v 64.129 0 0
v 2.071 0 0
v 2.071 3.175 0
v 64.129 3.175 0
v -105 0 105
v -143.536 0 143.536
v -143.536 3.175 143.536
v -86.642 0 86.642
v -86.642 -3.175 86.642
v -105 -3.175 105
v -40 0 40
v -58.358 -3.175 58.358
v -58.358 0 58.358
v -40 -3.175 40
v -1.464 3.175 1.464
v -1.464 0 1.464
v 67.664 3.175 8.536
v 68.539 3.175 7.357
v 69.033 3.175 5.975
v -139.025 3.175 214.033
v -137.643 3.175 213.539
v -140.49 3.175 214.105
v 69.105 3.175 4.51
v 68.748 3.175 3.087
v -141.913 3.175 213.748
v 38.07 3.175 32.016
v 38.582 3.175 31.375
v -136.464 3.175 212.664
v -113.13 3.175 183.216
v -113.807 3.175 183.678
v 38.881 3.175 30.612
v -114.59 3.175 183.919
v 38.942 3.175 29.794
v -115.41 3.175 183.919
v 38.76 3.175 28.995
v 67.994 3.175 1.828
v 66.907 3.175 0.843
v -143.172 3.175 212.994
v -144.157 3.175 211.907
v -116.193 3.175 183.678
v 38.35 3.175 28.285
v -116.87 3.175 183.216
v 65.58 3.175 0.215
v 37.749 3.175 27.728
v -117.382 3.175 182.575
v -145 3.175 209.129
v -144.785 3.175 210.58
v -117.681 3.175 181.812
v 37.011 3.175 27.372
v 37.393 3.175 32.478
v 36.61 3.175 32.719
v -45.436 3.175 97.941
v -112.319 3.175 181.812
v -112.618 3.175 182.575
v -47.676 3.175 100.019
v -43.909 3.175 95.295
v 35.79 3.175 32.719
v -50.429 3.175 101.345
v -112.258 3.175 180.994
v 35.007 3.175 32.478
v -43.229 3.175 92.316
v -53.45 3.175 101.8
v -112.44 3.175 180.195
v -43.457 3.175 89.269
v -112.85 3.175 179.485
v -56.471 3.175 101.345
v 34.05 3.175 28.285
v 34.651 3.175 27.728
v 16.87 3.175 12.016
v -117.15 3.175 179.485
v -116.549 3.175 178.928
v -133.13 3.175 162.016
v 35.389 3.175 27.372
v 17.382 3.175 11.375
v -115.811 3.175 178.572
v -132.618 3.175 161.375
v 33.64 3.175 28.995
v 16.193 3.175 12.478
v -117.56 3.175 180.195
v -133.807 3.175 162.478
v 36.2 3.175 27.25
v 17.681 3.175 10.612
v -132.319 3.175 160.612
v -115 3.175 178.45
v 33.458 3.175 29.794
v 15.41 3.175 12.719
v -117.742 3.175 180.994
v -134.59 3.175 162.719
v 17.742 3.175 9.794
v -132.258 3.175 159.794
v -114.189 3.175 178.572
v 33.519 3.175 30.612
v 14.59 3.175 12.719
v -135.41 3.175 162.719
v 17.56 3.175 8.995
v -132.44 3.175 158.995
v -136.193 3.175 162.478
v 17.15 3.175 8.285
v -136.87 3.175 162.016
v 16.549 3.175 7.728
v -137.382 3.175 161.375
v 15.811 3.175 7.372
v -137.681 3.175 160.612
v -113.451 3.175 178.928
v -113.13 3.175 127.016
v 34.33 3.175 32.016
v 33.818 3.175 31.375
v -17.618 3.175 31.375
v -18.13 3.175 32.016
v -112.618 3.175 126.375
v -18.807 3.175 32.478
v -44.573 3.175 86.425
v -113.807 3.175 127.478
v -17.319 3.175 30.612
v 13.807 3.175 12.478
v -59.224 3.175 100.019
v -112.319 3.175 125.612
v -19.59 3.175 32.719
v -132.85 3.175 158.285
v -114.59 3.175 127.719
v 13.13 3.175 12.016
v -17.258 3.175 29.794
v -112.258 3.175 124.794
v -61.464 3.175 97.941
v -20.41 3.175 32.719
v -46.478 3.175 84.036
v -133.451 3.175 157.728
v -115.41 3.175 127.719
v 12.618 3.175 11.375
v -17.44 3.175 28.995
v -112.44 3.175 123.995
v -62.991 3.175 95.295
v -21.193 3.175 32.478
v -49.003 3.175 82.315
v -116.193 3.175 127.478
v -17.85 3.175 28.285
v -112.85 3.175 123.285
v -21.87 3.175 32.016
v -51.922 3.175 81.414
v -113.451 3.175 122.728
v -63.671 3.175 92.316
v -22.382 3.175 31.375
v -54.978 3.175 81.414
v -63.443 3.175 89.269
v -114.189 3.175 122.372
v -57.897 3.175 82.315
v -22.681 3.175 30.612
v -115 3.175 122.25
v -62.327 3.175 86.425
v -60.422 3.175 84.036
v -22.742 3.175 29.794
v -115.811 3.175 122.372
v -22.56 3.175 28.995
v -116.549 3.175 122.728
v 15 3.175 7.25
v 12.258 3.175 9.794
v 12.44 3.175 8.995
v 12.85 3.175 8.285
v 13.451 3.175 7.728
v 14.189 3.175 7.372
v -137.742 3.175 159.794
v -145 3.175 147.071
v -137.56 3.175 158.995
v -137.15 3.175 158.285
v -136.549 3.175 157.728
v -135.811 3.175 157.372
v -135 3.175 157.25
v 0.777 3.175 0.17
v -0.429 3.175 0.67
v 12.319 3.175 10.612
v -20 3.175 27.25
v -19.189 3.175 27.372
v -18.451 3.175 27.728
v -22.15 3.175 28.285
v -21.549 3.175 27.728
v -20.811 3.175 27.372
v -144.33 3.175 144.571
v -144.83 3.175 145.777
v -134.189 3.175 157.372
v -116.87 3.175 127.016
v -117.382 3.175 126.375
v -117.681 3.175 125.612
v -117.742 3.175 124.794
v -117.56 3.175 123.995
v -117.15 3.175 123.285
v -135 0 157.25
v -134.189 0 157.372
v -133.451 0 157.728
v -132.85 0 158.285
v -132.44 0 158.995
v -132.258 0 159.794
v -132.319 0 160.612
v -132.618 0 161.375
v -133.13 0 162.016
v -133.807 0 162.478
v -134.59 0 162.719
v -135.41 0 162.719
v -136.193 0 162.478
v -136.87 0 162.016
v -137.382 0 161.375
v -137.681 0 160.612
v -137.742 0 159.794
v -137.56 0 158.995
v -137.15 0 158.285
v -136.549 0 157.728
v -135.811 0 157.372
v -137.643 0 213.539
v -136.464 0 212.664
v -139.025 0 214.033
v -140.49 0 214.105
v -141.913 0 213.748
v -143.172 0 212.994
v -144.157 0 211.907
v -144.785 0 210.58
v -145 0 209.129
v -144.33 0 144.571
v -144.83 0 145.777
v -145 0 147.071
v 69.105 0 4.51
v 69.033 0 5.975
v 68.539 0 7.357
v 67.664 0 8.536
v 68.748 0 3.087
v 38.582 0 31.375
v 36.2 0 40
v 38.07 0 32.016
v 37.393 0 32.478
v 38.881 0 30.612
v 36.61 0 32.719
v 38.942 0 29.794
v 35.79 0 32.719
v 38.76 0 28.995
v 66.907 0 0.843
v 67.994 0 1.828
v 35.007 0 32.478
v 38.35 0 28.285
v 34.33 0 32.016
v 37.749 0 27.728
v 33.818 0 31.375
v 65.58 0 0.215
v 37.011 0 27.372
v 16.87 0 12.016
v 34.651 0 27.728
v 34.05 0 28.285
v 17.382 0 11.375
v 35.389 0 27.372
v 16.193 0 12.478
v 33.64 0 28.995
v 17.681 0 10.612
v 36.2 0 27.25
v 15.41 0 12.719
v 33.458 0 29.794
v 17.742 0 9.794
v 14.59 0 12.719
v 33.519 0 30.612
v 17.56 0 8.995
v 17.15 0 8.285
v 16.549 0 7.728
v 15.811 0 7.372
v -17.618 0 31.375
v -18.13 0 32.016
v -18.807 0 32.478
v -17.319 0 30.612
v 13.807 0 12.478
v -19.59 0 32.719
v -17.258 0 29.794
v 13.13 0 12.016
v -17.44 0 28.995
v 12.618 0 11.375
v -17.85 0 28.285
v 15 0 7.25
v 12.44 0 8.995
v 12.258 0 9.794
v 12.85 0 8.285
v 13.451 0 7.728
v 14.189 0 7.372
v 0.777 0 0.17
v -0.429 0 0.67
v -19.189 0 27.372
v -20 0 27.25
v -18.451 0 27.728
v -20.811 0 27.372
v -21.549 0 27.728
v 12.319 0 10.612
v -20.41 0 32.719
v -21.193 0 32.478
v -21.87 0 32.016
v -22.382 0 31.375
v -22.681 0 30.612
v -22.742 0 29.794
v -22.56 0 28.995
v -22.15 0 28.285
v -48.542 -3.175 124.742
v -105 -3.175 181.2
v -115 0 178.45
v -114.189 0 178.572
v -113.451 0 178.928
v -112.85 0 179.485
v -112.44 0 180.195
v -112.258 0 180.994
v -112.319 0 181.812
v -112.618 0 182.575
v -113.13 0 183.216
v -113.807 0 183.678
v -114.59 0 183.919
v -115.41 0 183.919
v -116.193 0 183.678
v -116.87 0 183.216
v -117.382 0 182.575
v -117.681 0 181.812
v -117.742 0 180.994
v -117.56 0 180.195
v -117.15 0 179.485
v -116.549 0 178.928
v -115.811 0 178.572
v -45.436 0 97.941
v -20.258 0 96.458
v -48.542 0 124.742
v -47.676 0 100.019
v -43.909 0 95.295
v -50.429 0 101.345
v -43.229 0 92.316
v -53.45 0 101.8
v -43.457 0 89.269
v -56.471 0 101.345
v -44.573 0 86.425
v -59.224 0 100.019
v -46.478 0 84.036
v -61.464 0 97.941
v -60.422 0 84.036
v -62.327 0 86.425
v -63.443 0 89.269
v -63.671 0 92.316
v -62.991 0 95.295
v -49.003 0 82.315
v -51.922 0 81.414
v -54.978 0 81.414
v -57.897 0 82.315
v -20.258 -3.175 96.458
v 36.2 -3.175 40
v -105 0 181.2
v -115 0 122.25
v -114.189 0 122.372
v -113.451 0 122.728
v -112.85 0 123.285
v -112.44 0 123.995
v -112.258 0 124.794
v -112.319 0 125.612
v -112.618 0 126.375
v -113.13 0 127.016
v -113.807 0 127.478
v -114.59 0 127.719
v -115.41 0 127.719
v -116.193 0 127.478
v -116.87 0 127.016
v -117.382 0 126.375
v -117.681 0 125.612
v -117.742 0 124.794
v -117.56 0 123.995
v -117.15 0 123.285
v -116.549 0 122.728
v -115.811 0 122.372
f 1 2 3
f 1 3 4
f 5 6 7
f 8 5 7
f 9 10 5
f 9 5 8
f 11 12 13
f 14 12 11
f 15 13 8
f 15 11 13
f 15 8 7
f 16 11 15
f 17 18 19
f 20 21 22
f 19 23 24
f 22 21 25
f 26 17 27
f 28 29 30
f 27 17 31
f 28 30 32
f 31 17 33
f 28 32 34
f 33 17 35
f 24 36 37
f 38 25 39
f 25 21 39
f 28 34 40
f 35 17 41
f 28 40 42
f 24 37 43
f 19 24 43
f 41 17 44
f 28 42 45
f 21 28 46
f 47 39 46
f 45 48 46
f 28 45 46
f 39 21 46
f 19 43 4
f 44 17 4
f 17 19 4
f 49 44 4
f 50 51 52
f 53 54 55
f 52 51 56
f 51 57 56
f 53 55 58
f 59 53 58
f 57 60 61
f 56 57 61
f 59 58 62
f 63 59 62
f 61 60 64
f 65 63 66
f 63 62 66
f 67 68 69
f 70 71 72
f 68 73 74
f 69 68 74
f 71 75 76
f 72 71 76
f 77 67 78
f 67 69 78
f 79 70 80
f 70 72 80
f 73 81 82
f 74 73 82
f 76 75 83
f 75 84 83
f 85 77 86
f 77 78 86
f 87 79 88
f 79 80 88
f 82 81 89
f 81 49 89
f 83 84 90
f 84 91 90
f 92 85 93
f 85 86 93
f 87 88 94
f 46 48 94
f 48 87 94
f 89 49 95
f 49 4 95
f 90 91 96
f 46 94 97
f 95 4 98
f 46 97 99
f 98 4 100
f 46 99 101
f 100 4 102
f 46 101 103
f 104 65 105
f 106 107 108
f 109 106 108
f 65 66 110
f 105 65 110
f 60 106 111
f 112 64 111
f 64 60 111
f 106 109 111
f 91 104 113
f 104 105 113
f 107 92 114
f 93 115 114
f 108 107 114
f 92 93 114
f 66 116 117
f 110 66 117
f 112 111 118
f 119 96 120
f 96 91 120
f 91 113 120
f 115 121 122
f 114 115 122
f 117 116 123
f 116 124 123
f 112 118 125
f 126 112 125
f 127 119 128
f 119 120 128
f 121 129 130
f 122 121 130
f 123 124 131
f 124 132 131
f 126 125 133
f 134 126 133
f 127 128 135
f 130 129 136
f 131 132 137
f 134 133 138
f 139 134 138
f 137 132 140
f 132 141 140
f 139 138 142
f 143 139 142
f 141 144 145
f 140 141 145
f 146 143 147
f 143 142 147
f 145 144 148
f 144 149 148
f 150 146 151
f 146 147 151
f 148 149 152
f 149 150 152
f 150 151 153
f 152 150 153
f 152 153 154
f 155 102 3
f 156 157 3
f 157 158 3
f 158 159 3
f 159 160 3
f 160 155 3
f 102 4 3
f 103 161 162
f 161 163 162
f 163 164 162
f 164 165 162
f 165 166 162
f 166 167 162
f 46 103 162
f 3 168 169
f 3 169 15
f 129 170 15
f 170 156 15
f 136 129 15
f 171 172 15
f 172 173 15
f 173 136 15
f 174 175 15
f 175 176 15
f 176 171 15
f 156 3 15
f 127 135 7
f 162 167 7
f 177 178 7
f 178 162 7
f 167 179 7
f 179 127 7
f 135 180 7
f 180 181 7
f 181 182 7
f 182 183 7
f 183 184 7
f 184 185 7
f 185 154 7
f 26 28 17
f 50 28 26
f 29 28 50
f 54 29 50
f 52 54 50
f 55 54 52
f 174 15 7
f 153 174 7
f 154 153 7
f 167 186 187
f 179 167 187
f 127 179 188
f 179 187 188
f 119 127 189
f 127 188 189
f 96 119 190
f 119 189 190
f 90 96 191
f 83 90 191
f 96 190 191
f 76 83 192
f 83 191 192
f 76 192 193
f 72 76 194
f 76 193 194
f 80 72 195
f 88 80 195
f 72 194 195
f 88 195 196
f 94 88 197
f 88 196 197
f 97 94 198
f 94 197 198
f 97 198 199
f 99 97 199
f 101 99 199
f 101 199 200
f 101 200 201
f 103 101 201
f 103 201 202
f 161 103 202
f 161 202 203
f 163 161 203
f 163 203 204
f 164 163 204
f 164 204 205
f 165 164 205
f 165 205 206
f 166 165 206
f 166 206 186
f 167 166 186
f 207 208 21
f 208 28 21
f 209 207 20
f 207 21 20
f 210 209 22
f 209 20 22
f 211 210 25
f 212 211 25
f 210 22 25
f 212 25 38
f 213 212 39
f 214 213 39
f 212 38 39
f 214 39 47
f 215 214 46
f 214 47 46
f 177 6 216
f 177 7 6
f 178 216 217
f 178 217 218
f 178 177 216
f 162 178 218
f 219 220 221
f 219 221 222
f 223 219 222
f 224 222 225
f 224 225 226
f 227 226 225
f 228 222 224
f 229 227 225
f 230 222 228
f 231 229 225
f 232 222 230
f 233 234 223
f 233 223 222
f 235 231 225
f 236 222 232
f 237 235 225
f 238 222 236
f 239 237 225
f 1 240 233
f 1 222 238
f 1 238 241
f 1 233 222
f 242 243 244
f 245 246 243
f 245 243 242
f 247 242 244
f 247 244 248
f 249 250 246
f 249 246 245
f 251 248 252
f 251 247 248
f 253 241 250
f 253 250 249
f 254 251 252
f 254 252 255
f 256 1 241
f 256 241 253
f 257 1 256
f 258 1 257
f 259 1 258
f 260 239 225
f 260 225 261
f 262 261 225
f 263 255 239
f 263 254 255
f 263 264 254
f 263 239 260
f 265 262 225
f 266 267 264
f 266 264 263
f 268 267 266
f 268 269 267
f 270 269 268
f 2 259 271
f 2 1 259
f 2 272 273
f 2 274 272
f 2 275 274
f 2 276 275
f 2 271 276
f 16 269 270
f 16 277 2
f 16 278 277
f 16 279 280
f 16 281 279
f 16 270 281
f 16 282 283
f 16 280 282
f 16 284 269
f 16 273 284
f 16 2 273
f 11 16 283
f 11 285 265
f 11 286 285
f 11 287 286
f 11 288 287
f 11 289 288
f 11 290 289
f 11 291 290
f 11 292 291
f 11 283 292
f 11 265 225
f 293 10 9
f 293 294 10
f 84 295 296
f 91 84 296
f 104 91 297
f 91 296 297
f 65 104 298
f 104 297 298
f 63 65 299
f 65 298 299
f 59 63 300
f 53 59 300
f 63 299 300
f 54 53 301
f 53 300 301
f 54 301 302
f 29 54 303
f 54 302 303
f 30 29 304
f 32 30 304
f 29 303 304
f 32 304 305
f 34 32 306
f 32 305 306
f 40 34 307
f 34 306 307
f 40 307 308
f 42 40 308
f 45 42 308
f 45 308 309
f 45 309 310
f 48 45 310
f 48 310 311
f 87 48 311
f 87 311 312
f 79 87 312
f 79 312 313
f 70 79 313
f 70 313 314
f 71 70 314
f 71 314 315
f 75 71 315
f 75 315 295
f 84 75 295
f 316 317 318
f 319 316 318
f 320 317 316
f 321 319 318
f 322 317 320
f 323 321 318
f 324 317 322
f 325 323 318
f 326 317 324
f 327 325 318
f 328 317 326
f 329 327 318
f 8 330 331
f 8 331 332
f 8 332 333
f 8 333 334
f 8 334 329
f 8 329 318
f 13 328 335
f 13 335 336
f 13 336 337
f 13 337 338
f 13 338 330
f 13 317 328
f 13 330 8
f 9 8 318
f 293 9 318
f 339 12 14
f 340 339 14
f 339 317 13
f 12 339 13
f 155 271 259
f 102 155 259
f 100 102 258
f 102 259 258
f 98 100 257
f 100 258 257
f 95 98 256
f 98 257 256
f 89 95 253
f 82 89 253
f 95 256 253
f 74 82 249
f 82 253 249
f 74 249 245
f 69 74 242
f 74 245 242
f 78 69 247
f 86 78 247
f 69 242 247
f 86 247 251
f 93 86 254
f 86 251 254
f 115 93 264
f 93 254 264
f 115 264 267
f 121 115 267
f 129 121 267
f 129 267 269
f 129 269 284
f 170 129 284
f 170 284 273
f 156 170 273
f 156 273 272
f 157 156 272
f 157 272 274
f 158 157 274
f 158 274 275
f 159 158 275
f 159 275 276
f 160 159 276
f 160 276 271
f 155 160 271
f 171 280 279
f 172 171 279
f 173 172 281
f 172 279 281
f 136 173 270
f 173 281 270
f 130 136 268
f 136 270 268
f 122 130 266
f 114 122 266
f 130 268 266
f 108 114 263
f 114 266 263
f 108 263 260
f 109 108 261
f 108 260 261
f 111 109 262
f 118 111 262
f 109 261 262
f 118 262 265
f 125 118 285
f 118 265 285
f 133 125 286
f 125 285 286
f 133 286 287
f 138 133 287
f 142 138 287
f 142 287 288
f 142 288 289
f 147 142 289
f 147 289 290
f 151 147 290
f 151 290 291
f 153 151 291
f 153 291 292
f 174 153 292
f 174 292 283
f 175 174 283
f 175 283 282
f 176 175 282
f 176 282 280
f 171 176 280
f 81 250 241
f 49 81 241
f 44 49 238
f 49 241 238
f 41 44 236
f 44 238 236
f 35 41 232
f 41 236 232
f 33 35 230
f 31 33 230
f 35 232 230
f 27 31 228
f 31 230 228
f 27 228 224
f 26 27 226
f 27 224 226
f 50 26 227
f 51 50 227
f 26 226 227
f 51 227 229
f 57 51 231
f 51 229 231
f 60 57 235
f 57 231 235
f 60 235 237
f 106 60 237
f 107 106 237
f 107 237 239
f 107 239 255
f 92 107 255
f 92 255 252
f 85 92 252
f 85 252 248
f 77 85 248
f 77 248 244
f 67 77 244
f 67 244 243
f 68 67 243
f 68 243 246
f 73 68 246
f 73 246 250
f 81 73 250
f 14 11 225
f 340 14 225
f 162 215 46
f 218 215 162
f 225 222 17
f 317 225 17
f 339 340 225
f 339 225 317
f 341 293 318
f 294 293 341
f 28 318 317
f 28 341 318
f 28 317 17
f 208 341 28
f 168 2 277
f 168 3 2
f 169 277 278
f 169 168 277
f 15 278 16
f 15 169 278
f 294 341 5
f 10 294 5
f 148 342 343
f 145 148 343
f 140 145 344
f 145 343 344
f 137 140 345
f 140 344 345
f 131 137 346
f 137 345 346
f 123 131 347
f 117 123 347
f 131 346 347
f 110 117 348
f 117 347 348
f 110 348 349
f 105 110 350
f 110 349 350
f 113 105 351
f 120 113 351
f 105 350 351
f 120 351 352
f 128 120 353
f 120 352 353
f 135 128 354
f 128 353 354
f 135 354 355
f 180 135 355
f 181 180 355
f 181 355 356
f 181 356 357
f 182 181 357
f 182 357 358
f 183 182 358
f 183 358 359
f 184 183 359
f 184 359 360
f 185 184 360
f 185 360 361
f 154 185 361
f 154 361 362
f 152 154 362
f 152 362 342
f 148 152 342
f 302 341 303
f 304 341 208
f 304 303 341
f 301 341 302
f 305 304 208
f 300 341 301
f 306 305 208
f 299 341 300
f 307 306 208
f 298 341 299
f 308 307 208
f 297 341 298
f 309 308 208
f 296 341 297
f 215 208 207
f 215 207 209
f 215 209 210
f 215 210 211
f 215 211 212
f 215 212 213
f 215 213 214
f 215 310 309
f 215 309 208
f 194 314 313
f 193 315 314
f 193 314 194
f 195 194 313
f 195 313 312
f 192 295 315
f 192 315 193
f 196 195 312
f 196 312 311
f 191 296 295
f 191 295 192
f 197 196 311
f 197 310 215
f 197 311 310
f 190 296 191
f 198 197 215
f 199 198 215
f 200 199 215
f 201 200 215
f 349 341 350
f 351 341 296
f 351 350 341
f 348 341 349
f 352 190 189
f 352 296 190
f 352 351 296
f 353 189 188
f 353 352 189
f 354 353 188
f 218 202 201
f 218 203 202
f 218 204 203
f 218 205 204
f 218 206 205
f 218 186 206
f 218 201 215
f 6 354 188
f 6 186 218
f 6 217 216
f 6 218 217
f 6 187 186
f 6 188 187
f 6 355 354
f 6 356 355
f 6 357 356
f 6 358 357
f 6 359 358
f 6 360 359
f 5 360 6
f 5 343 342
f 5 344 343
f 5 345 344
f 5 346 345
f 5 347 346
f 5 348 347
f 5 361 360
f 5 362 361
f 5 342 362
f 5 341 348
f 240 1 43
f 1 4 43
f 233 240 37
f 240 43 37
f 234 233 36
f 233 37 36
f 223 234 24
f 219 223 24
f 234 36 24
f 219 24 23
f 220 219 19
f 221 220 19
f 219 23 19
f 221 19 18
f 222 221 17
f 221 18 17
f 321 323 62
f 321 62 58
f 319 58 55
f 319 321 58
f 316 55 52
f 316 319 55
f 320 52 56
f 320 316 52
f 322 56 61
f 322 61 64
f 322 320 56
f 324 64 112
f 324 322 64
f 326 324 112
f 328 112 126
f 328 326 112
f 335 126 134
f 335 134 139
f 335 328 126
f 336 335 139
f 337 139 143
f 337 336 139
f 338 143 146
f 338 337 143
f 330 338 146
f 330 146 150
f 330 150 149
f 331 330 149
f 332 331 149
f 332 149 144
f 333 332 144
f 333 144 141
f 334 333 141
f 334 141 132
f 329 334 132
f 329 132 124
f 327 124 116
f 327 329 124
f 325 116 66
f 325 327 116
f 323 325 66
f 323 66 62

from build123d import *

# Parameters (mm, degrees)
SKETCH1_R           = 10.25
BOSS_EXTRUDE1_DEPTH = 3.175
BOSS_EXTRUDE2_DEPTH = 3.175
FILLET1_R           = 5
CUT_EXTRUDE1_REACH  = 260.624
SKETCH3_R           = 2.75


with BuildPart() as part:
    # Sketch1 → Boss-Extrude1 (new body)
    with BuildSketch(Plane(origin=(0, 0, 0), x_dir=(1, 0, 0), z_dir=(0, 1, 0))):
        Polygon((0, 0), (76.2, 0), (-145, -221.2), (-145, -145), align=None)
        with Locations(Location((-53.45, -91.55, 0), (0, 0, 270))):
            Circle(SKETCH1_R, mode=Mode.SUBTRACT)
    extrude(amount=BOSS_EXTRUDE1_DEPTH)

    # Sketch2 → Boss-Extrude2 (add)
    with BuildSketch(Plane.XZ):
        Polygon((-20.257864376, 96.457864376), (-58.357864376, 58.357864376), (-40, 40), (36.2, 40), align=None)
        Polygon((-105, 105), (-86.642135624, 86.642135624), (-48.542135624, 124.742135624), (-105, 181.2), align=None)
    extrude(amount=BOSS_EXTRUDE2_DEPTH)

    # Fillet1
    fillet1_edges = [part.edges().sort_by_distance(p)[0] for p in [
        (0, 1.5875, 0),
        (76.2, 1.5875, 0),
        (-145, 1.5875, 221.2),
        (-145, 1.5875, 145),
    ]]
    fillet(fillet1_edges, radius=FILLET1_R)

    # Sketch3 → Cut-Extrude1 (cut, up to next)
    with BuildSketch(Plane(origin=(0, 0, 0), x_dir=(-1, 0, 0), z_dir=(0, -1, 0)), mode=Mode.PRIVATE) as cut_extrude1_sk1:
        with Locations(Location((115, -125, 0), (0, 0, 90))):
            Circle(SKETCH3_R)
    cut_extrude1_tool1 = extrude(cut_extrude1_sk1.sketch, amount=-CUT_EXTRUDE1_REACH, mode=Mode.PRIVATE) & part.part
    # Sketch3 → Cut-Extrude1 (cut, up to next)
    with BuildSketch(Plane(origin=(0, 0, 0), x_dir=(-1, 0, 0), z_dir=(0, -1, 0)), mode=Mode.PRIVATE) as cut_extrude1_sk2:
        with Locations(Location((115, -181.2, 0), (0, 0, 90))):
            Circle(SKETCH3_R)
    cut_extrude1_tool2 = extrude(cut_extrude1_sk2.sketch, amount=-CUT_EXTRUDE1_REACH, mode=Mode.PRIVATE) & part.part
    # Sketch3 → Cut-Extrude1 (cut, up to next)
    with BuildSketch(Plane(origin=(0, 0, 0), x_dir=(-1, 0, 0), z_dir=(0, -1, 0)), mode=Mode.PRIVATE) as cut_extrude1_sk3:
        with Locations(Location((135, -160, 0), (0, 0, 90))):
            Circle(SKETCH3_R)
    cut_extrude1_tool3 = extrude(cut_extrude1_sk3.sketch, amount=-CUT_EXTRUDE1_REACH, mode=Mode.PRIVATE) & part.part
    # Sketch3 → Cut-Extrude1 (cut, up to next)
    with BuildSketch(Plane(origin=(0, 0, 0), x_dir=(-1, 0, 0), z_dir=(0, -1, 0)), mode=Mode.PRIVATE) as cut_extrude1_sk4:
        with Locations(Location((-15, -10, 0), (0, 0, 90))):
            Circle(SKETCH3_R)
    cut_extrude1_tool4 = extrude(cut_extrude1_sk4.sketch, amount=-CUT_EXTRUDE1_REACH, mode=Mode.PRIVATE) & part.part
    # Sketch3 → Cut-Extrude1 (cut, up to next)
    with BuildSketch(Plane(origin=(0, 0, 0), x_dir=(-1, 0, 0), z_dir=(0, -1, 0)), mode=Mode.PRIVATE) as cut_extrude1_sk5:
        with Locations(Location((-36.2, -30, 0), (0, 0, 90))):
            Circle(SKETCH3_R)
    cut_extrude1_tool5 = extrude(cut_extrude1_sk5.sketch, amount=-CUT_EXTRUDE1_REACH, mode=Mode.PRIVATE) & part.part
    # Sketch3 → Cut-Extrude1 (cut, up to next)
    with BuildSketch(Plane(origin=(0, 0, 0), x_dir=(-1, 0, 0), z_dir=(0, -1, 0)), mode=Mode.PRIVATE) as cut_extrude1_sk6:
        with Locations(Location((20, -30, 0), (0, 0, 90))):
            Circle(SKETCH3_R)
    cut_extrude1_tool6 = extrude(cut_extrude1_sk6.sketch, amount=-CUT_EXTRUDE1_REACH, mode=Mode.PRIVATE) & part.part
    add(cut_extrude1_tool1.solids().sort_by_distance((-115, 0, 125))[0], mode=Mode.SUBTRACT)
    add(cut_extrude1_tool2.solids().sort_by_distance((-115, 0, 181.2))[0], mode=Mode.SUBTRACT)
    add(cut_extrude1_tool3.solids().sort_by_distance((-135, 0, 160))[0], mode=Mode.SUBTRACT)
    add(cut_extrude1_tool4.solids().sort_by_distance((15, 0, 10))[0], mode=Mode.SUBTRACT)
    add(cut_extrude1_tool5.solids().sort_by_distance((36.2, 0, 30))[0], mode=Mode.SUBTRACT)
    add(cut_extrude1_tool6.solids().sort_by_distance((-20, 0, 30))[0], mode=Mode.SUBTRACT)


solid = part.part
